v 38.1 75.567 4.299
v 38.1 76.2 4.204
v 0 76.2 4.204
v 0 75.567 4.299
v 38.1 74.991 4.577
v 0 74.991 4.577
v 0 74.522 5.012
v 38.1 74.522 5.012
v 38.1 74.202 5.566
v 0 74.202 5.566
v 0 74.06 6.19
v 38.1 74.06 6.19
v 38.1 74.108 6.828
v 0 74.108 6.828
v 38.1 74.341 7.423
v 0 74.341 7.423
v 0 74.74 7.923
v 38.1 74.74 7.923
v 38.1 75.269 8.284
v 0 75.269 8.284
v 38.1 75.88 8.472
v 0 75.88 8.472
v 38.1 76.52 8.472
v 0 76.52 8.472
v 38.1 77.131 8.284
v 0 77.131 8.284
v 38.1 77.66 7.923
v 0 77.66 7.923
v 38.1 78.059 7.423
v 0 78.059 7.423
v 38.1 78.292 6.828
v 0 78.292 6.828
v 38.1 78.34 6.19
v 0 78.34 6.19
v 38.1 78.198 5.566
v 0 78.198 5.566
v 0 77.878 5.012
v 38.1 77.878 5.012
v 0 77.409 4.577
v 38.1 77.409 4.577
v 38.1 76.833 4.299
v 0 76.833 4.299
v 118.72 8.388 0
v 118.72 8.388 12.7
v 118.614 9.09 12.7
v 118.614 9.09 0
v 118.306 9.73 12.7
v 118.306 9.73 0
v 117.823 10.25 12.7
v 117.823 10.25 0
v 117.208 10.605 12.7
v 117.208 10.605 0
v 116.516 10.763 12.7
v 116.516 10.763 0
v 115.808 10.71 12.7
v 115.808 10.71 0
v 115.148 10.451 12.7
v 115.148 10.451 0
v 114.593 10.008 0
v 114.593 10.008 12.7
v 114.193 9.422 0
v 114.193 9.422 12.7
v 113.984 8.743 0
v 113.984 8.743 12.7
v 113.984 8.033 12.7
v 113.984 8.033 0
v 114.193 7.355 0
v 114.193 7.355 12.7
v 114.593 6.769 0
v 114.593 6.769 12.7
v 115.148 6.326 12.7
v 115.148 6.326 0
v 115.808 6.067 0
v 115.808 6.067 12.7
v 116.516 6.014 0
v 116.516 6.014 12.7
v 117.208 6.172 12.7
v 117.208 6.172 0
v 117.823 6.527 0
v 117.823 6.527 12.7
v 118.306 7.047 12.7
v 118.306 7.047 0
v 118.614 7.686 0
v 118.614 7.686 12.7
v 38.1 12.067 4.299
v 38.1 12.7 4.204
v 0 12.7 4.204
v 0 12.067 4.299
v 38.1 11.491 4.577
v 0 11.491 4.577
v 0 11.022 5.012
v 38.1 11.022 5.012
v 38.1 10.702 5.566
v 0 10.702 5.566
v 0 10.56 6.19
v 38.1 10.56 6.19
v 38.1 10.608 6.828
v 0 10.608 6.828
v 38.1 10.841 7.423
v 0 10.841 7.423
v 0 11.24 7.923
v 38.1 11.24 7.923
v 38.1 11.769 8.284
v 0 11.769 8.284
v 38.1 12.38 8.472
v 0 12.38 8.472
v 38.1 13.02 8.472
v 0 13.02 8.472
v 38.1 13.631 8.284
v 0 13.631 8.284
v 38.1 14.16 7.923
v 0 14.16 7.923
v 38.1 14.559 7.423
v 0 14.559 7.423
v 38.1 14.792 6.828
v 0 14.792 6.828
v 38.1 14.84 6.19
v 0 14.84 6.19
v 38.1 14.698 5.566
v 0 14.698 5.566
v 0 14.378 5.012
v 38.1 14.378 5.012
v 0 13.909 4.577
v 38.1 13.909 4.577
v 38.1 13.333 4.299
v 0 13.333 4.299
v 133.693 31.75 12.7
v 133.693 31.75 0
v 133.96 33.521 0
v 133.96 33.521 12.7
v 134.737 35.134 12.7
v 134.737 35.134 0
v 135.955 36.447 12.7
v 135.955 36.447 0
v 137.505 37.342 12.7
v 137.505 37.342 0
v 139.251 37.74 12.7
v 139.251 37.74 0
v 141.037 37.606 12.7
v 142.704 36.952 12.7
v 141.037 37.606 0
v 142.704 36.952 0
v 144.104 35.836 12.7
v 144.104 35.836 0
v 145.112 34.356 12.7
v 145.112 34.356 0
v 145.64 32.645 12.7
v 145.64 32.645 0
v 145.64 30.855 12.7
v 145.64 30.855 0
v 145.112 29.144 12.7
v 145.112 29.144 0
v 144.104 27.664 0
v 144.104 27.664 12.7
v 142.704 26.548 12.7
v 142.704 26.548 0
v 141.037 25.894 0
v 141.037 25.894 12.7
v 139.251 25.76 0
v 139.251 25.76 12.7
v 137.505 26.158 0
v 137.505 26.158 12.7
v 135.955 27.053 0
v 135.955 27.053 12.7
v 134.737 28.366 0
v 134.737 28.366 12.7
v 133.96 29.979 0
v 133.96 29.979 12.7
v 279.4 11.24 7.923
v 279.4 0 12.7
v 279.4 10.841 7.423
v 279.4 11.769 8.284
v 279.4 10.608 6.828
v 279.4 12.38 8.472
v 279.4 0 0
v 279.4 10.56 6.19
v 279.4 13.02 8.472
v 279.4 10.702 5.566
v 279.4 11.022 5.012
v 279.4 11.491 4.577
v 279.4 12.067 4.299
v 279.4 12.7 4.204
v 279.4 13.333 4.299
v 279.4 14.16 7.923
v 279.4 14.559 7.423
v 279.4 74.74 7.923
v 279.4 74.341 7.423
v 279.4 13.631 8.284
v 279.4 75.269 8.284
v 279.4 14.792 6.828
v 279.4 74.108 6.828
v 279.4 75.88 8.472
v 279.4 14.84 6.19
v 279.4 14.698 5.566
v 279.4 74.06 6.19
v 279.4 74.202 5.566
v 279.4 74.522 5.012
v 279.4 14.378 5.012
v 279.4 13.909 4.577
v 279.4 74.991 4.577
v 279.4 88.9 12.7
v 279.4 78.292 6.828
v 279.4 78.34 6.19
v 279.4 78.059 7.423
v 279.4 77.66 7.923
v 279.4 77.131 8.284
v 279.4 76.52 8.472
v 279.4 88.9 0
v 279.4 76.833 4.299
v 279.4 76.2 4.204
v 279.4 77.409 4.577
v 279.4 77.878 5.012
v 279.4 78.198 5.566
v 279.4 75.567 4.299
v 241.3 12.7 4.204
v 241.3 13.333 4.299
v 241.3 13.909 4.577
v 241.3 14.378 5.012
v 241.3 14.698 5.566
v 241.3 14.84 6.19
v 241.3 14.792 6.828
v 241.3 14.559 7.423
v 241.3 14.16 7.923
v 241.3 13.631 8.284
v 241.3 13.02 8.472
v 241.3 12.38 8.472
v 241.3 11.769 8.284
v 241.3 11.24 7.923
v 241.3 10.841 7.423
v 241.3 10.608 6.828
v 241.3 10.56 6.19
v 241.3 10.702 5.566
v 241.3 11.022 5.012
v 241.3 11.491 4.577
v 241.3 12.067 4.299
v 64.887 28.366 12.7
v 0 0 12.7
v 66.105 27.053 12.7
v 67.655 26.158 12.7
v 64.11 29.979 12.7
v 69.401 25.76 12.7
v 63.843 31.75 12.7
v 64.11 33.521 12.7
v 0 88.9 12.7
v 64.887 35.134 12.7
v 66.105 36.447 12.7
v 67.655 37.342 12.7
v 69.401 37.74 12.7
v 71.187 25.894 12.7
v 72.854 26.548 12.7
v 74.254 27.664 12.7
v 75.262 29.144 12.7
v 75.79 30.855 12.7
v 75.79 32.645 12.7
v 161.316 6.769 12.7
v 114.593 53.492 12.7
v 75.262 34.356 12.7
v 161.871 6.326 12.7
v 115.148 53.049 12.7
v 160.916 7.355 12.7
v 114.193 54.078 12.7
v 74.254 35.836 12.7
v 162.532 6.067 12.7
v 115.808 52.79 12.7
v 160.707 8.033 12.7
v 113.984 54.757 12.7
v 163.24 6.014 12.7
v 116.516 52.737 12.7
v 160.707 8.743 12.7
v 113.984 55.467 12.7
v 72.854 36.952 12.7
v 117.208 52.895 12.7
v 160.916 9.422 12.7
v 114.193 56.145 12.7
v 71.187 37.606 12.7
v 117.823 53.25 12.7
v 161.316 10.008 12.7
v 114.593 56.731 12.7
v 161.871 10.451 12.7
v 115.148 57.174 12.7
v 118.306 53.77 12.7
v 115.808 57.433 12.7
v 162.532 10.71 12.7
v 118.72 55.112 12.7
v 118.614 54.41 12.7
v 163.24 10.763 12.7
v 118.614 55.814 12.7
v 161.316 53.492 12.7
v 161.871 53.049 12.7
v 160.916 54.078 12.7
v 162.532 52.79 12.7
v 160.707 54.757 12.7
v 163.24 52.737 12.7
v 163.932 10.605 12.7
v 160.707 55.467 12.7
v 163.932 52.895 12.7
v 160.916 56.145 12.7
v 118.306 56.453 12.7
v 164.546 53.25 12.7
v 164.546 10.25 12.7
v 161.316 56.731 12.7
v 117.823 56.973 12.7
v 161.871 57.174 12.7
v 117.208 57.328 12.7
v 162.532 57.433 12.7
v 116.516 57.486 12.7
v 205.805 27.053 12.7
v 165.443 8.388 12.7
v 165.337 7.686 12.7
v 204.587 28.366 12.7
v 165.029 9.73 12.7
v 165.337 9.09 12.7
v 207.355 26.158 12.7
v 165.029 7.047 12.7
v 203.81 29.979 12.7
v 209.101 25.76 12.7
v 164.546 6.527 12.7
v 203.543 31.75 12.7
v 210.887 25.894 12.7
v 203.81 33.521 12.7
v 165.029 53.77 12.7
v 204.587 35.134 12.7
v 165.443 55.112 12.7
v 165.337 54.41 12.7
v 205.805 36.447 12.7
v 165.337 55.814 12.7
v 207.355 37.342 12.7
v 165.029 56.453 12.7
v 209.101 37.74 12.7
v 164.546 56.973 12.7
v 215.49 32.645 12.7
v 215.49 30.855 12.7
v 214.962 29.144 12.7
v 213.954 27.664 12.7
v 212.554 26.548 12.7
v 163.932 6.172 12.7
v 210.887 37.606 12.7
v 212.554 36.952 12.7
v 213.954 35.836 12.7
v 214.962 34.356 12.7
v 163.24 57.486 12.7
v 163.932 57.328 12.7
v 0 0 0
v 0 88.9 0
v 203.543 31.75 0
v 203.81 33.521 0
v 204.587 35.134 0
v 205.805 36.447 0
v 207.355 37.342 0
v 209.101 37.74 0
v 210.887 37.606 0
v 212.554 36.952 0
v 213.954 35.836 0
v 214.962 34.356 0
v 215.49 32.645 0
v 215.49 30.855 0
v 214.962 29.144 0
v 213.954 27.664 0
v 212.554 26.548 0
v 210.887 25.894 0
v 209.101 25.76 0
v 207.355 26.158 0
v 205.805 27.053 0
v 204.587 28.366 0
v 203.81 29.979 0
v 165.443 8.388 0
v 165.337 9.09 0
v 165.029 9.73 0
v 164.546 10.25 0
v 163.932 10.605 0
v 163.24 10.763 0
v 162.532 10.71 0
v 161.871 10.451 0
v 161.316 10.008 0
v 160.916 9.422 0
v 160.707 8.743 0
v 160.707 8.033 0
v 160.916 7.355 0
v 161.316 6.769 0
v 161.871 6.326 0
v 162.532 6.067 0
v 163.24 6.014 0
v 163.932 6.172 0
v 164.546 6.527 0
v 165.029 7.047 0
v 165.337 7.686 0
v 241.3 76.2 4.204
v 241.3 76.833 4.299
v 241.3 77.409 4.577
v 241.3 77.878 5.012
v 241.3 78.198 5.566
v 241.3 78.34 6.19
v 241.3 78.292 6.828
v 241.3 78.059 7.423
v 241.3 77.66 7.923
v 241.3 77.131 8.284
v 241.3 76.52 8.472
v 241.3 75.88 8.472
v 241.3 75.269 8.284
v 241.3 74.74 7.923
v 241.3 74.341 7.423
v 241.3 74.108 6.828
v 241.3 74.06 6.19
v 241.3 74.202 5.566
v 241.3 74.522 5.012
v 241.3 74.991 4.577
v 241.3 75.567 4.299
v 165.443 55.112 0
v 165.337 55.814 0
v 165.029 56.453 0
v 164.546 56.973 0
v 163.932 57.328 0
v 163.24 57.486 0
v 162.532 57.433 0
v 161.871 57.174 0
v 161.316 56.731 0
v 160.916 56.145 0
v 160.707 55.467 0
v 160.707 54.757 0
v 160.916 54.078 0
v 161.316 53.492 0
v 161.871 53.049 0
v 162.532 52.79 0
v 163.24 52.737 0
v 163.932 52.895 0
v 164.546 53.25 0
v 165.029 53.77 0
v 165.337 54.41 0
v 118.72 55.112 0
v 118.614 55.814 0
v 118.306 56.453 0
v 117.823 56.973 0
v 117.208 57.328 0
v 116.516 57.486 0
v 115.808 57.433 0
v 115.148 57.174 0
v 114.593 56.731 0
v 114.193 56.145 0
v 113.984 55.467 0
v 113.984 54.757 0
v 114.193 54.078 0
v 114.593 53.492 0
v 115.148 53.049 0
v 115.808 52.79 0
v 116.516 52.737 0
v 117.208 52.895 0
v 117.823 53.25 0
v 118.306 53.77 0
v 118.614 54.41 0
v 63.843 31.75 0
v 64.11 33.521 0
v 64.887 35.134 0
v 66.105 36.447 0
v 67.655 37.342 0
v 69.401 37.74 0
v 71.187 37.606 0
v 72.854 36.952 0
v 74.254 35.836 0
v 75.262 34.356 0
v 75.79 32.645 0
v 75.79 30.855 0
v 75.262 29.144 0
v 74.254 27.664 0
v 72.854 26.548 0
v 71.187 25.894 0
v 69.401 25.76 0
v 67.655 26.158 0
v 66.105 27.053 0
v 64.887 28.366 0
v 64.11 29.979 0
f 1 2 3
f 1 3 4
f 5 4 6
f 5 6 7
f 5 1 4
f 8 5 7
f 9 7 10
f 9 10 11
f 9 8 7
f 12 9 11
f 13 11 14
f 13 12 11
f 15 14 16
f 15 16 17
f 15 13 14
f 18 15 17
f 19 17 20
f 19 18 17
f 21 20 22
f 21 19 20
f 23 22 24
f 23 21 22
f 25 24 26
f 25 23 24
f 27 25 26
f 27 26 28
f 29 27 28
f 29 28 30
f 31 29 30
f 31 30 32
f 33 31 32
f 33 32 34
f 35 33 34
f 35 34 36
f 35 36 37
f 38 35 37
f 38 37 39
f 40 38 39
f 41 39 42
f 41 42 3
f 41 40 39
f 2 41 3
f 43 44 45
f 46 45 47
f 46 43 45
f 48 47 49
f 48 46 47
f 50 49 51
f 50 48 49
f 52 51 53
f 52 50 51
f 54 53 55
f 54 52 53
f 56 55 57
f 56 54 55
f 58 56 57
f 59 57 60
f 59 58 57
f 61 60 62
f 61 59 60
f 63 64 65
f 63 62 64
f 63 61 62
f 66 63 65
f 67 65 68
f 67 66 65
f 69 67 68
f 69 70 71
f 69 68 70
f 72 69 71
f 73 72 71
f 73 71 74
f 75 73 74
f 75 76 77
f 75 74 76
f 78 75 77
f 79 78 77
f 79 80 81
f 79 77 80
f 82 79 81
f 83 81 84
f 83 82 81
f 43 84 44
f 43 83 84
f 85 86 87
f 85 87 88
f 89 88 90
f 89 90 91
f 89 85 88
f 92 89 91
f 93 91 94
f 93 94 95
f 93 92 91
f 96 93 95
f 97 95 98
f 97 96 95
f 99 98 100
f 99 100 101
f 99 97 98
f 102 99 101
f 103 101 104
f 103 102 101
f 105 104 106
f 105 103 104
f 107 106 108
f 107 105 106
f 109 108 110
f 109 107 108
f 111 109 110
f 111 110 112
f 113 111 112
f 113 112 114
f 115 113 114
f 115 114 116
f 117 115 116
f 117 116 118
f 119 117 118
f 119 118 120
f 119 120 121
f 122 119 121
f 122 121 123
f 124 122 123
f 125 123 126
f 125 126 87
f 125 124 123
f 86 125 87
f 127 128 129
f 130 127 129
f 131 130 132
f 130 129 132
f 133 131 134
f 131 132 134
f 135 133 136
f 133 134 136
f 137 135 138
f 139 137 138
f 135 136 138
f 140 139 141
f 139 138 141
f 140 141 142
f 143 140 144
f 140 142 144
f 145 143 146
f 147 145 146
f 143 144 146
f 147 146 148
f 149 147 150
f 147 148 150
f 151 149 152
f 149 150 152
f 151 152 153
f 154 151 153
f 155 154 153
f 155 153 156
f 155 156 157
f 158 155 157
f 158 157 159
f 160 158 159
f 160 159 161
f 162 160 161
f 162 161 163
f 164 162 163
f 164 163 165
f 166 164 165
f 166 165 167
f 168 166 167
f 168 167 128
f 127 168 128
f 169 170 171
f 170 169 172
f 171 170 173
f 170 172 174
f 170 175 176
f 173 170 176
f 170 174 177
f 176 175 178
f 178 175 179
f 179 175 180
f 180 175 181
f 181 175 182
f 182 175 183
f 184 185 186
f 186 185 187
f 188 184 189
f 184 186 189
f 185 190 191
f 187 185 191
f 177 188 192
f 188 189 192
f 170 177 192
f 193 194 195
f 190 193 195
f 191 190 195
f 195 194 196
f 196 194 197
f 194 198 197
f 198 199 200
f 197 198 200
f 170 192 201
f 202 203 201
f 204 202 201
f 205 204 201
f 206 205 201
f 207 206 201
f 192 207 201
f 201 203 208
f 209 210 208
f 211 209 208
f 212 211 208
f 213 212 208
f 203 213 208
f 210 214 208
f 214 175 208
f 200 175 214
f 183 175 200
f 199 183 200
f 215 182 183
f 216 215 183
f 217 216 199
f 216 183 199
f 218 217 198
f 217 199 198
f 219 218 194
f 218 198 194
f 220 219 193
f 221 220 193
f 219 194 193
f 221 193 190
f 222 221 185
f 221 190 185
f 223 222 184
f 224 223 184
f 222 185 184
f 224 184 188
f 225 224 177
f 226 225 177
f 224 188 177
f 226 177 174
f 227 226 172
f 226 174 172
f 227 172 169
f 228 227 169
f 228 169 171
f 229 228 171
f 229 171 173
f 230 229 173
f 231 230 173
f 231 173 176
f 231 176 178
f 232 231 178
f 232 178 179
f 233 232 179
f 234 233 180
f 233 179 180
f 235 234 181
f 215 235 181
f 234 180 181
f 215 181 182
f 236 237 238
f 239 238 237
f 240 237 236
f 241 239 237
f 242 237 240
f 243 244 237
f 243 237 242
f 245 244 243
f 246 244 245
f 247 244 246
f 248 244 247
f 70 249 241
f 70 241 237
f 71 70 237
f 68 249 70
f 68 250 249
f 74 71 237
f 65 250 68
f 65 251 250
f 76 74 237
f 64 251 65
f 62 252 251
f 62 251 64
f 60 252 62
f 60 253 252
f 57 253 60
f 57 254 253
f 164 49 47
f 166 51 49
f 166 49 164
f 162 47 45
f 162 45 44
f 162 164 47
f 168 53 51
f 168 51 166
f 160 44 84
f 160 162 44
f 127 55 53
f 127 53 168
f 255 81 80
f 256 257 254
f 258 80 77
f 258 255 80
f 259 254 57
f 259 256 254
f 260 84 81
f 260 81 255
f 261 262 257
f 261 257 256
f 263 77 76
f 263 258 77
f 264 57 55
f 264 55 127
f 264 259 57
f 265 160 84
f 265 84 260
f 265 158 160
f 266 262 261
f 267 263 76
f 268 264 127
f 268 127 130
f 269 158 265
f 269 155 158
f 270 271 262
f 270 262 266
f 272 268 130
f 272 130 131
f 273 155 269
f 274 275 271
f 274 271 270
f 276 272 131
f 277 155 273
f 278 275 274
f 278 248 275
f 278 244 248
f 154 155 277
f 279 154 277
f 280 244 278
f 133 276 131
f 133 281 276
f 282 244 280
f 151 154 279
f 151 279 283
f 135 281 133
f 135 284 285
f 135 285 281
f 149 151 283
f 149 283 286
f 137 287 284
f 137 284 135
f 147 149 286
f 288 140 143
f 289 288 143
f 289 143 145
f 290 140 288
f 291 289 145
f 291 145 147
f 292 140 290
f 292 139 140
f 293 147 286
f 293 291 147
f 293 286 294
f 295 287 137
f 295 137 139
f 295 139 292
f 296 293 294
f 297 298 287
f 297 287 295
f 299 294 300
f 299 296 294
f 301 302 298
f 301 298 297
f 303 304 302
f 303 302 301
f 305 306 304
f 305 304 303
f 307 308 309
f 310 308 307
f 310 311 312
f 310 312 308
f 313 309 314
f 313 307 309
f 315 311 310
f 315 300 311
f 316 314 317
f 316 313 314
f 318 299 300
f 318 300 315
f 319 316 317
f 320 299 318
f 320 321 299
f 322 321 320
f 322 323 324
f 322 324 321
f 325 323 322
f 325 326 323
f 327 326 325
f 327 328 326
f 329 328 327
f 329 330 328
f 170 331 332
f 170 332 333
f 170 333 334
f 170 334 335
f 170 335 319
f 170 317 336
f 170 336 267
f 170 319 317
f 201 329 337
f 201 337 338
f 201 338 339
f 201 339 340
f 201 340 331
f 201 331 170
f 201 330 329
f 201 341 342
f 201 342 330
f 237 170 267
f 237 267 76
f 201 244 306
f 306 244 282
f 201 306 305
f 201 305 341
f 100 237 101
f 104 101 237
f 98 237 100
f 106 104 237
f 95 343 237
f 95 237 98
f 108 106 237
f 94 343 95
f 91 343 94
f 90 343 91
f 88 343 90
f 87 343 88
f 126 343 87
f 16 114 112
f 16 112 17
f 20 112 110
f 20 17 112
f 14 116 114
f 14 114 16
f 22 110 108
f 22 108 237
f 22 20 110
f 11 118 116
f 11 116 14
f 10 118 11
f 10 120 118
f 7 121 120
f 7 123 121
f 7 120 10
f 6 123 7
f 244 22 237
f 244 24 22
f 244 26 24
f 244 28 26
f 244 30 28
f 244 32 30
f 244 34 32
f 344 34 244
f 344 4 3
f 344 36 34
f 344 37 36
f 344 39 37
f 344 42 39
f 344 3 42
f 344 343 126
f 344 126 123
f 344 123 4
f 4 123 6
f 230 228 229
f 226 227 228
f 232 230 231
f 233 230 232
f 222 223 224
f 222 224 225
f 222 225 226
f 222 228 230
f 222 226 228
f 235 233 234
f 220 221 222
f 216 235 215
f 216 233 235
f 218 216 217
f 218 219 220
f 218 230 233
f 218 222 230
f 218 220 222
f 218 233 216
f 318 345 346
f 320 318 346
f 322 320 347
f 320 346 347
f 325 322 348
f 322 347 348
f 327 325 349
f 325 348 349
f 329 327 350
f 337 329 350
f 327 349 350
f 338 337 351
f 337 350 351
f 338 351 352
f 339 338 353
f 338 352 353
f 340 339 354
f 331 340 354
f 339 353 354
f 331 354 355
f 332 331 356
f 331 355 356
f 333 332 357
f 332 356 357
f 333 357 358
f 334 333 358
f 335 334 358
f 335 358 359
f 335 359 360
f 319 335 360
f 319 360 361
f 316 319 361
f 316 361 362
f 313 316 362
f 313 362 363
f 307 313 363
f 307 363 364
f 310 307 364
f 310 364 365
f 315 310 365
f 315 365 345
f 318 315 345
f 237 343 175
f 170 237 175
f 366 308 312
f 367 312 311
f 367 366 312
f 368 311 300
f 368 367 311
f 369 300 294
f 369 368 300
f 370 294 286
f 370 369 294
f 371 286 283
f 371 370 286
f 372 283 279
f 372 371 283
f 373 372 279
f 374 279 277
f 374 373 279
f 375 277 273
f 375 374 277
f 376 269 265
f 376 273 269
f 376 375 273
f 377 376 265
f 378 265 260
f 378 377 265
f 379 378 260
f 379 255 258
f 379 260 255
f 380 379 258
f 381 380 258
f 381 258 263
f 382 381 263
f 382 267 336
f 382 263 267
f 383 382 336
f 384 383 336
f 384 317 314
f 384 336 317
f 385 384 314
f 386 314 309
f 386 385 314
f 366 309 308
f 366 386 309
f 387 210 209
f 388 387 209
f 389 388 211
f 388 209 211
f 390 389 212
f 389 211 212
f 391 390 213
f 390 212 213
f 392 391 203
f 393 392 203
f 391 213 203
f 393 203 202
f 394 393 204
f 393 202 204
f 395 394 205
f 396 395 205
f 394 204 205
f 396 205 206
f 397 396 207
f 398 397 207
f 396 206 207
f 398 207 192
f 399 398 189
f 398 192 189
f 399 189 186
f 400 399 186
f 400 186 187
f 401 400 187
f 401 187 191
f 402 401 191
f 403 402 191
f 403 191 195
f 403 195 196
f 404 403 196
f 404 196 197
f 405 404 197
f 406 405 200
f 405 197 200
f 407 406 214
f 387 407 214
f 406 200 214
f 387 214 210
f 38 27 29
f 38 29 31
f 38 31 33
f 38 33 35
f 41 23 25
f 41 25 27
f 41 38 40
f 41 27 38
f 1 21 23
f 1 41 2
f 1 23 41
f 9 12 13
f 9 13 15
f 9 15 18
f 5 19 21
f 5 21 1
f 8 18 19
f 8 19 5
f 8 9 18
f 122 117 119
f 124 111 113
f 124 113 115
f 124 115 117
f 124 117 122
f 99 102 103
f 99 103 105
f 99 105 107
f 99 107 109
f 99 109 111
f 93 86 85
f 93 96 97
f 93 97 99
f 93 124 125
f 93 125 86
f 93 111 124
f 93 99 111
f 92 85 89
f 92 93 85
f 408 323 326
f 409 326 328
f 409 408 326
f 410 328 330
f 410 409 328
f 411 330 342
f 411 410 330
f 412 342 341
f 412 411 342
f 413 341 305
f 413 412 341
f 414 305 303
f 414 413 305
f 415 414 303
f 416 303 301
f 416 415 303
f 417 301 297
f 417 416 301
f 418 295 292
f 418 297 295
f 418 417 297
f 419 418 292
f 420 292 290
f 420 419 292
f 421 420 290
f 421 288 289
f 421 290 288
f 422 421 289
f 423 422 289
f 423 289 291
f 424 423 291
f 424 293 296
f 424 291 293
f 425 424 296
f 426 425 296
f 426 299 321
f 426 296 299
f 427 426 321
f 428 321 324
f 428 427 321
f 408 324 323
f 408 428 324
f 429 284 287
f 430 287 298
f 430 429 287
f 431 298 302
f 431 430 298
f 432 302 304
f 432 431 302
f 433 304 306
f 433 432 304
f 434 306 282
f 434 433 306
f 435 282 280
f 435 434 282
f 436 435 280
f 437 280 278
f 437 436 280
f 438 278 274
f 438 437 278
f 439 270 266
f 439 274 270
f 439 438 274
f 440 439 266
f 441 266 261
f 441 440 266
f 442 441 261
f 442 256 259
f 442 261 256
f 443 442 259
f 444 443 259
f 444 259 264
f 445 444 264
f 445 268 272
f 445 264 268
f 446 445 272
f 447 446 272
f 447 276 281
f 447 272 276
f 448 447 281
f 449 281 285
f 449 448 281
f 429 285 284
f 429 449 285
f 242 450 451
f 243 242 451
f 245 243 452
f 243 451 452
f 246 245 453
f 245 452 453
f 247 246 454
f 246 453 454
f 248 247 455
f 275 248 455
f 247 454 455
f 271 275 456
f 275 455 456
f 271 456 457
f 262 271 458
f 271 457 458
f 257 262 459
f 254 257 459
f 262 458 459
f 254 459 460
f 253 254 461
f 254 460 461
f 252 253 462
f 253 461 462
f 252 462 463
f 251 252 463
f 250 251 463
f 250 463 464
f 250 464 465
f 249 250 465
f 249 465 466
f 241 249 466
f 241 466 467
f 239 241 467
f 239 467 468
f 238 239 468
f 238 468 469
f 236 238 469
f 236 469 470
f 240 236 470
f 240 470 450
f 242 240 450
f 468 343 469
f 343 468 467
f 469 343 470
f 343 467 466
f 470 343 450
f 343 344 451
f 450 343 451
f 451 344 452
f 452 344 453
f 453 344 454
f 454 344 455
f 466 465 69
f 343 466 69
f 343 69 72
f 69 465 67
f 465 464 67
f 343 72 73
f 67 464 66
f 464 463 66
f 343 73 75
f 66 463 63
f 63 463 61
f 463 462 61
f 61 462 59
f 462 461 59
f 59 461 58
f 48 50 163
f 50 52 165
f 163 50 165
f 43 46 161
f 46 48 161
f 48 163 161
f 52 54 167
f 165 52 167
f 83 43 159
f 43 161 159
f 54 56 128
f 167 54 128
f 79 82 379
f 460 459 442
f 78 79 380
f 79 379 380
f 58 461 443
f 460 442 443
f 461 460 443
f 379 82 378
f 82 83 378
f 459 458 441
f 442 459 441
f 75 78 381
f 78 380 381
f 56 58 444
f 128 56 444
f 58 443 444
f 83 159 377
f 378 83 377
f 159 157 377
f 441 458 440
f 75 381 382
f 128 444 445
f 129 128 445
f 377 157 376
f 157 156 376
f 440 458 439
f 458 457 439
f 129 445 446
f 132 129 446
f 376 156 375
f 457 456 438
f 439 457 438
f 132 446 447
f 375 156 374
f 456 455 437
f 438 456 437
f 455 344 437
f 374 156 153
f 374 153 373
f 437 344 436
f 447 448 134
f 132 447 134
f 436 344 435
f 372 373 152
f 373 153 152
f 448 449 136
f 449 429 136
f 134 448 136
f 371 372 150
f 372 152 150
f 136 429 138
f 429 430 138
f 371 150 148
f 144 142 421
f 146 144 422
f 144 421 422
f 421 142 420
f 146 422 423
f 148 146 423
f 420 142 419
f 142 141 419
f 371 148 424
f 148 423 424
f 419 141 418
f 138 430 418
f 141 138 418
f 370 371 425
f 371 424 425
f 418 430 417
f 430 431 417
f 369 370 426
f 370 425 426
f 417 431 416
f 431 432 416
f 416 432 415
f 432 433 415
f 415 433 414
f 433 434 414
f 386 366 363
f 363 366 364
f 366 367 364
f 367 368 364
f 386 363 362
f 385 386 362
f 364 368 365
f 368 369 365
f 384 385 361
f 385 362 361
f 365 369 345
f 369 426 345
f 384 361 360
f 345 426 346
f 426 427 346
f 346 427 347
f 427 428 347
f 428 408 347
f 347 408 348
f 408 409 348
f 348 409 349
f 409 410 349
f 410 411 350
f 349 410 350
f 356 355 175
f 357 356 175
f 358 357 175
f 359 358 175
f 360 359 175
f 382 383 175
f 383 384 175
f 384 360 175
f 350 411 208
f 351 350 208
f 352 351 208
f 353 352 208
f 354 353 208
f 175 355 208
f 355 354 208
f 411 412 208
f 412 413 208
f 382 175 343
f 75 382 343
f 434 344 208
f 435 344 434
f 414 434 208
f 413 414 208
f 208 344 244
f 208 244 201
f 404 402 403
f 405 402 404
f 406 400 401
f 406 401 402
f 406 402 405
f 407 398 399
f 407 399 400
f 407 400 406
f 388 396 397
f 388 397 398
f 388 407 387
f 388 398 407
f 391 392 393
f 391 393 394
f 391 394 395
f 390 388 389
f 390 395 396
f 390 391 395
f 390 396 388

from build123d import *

# Parameters (mm, degrees)
SKETCH1_W           = 279.4
SKETCH1_H           = 88.9
BOSS_EXTRUDE1_DEPTH = 12.7
SKETCH2_R           = 2.1463
CUT_EXTRUDE1_DEPTH  = 38.1
CUT_EXTRUDE2_START  = -38.1
SKETCH3_R           = 2.1463
CUT_EXTRUDE2_DEPTH  = 38.1
SKETCH4_R           = 6.0071
CUT_EXTRUDE3_DEPTH  = 294.477188211
SKETCH5_R           = 2.38125
CUT_EXTRUDE4_DEPTH  = 294.477188211


with BuildPart() as part:
    # Sketch1 → Boss-Extrude1 (new body)
    with BuildSketch(Plane.XY):
        with Locations((139.7, 44.45)):
            Rectangle(SKETCH1_W, SKETCH1_H)
    extrude(amount=BOSS_EXTRUDE1_DEPTH)

    # Sketch2 → Cut-Extrude1 (cut)
    with BuildSketch(Plane(origin=(279.4, 0, 0), x_dir=(0, 0, -1), z_dir=(1, 0, 0))):
        with Locations((-6.35, 76.2)):
            Circle(SKETCH2_R)
        with Locations((-6.35, 12.7)):
            Circle(SKETCH2_R)
    extrude(amount=-CUT_EXTRUDE1_DEPTH, mode=Mode.SUBTRACT)

    # Sketch3 → Cut-Extrude2 (cut)
    with BuildSketch(Plane.ZY.offset(CUT_EXTRUDE2_START)):
        with Locations(Location((6.35, 76.2, 0), (0, 0, 180))):
            Circle(SKETCH3_R)
        with Locations(Location((6.35, 12.7, 0), (0, 0, 180))):
            Circle(SKETCH3_R)
    extrude(amount=CUT_EXTRUDE2_DEPTH, mode=Mode.SUBTRACT)

    # Sketch4 → Cut-Extrude3 (cut, through all)
    with BuildSketch(Plane(origin=(0, 0, 0), x_dir=(-1, 0, 0), z_dir=(0, 0, -1))):
        with Locations((-209.55, 31.75)):
            Circle(SKETCH4_R)
        with Locations((-139.7, 31.75)):
            Circle(SKETCH4_R)
        with Locations((-69.85, 31.75)):
            Circle(SKETCH4_R)
    extrude(amount=-CUT_EXTRUDE3_DEPTH, mode=Mode.SUBTRACT)

    # Sketch5 → Cut-Extrude4 (cut, through all)
    with BuildSketch(Plane.XY):
        with Locations((163.06165, 55.11165)):
            Circle(SKETCH5_R)
        with Locations((116.33835, 55.11165)):
            Circle(SKETCH5_R)
        with Locations((116.33835, 8.38835)):
            Circle(SKETCH5_R)
        with Locations((163.06165, 8.38835)):
            Circle(SKETCH5_R)
    extrude(amount=CUT_EXTRUDE4_DEPTH, mode=Mode.SUBTRACT)


solid = part.part
